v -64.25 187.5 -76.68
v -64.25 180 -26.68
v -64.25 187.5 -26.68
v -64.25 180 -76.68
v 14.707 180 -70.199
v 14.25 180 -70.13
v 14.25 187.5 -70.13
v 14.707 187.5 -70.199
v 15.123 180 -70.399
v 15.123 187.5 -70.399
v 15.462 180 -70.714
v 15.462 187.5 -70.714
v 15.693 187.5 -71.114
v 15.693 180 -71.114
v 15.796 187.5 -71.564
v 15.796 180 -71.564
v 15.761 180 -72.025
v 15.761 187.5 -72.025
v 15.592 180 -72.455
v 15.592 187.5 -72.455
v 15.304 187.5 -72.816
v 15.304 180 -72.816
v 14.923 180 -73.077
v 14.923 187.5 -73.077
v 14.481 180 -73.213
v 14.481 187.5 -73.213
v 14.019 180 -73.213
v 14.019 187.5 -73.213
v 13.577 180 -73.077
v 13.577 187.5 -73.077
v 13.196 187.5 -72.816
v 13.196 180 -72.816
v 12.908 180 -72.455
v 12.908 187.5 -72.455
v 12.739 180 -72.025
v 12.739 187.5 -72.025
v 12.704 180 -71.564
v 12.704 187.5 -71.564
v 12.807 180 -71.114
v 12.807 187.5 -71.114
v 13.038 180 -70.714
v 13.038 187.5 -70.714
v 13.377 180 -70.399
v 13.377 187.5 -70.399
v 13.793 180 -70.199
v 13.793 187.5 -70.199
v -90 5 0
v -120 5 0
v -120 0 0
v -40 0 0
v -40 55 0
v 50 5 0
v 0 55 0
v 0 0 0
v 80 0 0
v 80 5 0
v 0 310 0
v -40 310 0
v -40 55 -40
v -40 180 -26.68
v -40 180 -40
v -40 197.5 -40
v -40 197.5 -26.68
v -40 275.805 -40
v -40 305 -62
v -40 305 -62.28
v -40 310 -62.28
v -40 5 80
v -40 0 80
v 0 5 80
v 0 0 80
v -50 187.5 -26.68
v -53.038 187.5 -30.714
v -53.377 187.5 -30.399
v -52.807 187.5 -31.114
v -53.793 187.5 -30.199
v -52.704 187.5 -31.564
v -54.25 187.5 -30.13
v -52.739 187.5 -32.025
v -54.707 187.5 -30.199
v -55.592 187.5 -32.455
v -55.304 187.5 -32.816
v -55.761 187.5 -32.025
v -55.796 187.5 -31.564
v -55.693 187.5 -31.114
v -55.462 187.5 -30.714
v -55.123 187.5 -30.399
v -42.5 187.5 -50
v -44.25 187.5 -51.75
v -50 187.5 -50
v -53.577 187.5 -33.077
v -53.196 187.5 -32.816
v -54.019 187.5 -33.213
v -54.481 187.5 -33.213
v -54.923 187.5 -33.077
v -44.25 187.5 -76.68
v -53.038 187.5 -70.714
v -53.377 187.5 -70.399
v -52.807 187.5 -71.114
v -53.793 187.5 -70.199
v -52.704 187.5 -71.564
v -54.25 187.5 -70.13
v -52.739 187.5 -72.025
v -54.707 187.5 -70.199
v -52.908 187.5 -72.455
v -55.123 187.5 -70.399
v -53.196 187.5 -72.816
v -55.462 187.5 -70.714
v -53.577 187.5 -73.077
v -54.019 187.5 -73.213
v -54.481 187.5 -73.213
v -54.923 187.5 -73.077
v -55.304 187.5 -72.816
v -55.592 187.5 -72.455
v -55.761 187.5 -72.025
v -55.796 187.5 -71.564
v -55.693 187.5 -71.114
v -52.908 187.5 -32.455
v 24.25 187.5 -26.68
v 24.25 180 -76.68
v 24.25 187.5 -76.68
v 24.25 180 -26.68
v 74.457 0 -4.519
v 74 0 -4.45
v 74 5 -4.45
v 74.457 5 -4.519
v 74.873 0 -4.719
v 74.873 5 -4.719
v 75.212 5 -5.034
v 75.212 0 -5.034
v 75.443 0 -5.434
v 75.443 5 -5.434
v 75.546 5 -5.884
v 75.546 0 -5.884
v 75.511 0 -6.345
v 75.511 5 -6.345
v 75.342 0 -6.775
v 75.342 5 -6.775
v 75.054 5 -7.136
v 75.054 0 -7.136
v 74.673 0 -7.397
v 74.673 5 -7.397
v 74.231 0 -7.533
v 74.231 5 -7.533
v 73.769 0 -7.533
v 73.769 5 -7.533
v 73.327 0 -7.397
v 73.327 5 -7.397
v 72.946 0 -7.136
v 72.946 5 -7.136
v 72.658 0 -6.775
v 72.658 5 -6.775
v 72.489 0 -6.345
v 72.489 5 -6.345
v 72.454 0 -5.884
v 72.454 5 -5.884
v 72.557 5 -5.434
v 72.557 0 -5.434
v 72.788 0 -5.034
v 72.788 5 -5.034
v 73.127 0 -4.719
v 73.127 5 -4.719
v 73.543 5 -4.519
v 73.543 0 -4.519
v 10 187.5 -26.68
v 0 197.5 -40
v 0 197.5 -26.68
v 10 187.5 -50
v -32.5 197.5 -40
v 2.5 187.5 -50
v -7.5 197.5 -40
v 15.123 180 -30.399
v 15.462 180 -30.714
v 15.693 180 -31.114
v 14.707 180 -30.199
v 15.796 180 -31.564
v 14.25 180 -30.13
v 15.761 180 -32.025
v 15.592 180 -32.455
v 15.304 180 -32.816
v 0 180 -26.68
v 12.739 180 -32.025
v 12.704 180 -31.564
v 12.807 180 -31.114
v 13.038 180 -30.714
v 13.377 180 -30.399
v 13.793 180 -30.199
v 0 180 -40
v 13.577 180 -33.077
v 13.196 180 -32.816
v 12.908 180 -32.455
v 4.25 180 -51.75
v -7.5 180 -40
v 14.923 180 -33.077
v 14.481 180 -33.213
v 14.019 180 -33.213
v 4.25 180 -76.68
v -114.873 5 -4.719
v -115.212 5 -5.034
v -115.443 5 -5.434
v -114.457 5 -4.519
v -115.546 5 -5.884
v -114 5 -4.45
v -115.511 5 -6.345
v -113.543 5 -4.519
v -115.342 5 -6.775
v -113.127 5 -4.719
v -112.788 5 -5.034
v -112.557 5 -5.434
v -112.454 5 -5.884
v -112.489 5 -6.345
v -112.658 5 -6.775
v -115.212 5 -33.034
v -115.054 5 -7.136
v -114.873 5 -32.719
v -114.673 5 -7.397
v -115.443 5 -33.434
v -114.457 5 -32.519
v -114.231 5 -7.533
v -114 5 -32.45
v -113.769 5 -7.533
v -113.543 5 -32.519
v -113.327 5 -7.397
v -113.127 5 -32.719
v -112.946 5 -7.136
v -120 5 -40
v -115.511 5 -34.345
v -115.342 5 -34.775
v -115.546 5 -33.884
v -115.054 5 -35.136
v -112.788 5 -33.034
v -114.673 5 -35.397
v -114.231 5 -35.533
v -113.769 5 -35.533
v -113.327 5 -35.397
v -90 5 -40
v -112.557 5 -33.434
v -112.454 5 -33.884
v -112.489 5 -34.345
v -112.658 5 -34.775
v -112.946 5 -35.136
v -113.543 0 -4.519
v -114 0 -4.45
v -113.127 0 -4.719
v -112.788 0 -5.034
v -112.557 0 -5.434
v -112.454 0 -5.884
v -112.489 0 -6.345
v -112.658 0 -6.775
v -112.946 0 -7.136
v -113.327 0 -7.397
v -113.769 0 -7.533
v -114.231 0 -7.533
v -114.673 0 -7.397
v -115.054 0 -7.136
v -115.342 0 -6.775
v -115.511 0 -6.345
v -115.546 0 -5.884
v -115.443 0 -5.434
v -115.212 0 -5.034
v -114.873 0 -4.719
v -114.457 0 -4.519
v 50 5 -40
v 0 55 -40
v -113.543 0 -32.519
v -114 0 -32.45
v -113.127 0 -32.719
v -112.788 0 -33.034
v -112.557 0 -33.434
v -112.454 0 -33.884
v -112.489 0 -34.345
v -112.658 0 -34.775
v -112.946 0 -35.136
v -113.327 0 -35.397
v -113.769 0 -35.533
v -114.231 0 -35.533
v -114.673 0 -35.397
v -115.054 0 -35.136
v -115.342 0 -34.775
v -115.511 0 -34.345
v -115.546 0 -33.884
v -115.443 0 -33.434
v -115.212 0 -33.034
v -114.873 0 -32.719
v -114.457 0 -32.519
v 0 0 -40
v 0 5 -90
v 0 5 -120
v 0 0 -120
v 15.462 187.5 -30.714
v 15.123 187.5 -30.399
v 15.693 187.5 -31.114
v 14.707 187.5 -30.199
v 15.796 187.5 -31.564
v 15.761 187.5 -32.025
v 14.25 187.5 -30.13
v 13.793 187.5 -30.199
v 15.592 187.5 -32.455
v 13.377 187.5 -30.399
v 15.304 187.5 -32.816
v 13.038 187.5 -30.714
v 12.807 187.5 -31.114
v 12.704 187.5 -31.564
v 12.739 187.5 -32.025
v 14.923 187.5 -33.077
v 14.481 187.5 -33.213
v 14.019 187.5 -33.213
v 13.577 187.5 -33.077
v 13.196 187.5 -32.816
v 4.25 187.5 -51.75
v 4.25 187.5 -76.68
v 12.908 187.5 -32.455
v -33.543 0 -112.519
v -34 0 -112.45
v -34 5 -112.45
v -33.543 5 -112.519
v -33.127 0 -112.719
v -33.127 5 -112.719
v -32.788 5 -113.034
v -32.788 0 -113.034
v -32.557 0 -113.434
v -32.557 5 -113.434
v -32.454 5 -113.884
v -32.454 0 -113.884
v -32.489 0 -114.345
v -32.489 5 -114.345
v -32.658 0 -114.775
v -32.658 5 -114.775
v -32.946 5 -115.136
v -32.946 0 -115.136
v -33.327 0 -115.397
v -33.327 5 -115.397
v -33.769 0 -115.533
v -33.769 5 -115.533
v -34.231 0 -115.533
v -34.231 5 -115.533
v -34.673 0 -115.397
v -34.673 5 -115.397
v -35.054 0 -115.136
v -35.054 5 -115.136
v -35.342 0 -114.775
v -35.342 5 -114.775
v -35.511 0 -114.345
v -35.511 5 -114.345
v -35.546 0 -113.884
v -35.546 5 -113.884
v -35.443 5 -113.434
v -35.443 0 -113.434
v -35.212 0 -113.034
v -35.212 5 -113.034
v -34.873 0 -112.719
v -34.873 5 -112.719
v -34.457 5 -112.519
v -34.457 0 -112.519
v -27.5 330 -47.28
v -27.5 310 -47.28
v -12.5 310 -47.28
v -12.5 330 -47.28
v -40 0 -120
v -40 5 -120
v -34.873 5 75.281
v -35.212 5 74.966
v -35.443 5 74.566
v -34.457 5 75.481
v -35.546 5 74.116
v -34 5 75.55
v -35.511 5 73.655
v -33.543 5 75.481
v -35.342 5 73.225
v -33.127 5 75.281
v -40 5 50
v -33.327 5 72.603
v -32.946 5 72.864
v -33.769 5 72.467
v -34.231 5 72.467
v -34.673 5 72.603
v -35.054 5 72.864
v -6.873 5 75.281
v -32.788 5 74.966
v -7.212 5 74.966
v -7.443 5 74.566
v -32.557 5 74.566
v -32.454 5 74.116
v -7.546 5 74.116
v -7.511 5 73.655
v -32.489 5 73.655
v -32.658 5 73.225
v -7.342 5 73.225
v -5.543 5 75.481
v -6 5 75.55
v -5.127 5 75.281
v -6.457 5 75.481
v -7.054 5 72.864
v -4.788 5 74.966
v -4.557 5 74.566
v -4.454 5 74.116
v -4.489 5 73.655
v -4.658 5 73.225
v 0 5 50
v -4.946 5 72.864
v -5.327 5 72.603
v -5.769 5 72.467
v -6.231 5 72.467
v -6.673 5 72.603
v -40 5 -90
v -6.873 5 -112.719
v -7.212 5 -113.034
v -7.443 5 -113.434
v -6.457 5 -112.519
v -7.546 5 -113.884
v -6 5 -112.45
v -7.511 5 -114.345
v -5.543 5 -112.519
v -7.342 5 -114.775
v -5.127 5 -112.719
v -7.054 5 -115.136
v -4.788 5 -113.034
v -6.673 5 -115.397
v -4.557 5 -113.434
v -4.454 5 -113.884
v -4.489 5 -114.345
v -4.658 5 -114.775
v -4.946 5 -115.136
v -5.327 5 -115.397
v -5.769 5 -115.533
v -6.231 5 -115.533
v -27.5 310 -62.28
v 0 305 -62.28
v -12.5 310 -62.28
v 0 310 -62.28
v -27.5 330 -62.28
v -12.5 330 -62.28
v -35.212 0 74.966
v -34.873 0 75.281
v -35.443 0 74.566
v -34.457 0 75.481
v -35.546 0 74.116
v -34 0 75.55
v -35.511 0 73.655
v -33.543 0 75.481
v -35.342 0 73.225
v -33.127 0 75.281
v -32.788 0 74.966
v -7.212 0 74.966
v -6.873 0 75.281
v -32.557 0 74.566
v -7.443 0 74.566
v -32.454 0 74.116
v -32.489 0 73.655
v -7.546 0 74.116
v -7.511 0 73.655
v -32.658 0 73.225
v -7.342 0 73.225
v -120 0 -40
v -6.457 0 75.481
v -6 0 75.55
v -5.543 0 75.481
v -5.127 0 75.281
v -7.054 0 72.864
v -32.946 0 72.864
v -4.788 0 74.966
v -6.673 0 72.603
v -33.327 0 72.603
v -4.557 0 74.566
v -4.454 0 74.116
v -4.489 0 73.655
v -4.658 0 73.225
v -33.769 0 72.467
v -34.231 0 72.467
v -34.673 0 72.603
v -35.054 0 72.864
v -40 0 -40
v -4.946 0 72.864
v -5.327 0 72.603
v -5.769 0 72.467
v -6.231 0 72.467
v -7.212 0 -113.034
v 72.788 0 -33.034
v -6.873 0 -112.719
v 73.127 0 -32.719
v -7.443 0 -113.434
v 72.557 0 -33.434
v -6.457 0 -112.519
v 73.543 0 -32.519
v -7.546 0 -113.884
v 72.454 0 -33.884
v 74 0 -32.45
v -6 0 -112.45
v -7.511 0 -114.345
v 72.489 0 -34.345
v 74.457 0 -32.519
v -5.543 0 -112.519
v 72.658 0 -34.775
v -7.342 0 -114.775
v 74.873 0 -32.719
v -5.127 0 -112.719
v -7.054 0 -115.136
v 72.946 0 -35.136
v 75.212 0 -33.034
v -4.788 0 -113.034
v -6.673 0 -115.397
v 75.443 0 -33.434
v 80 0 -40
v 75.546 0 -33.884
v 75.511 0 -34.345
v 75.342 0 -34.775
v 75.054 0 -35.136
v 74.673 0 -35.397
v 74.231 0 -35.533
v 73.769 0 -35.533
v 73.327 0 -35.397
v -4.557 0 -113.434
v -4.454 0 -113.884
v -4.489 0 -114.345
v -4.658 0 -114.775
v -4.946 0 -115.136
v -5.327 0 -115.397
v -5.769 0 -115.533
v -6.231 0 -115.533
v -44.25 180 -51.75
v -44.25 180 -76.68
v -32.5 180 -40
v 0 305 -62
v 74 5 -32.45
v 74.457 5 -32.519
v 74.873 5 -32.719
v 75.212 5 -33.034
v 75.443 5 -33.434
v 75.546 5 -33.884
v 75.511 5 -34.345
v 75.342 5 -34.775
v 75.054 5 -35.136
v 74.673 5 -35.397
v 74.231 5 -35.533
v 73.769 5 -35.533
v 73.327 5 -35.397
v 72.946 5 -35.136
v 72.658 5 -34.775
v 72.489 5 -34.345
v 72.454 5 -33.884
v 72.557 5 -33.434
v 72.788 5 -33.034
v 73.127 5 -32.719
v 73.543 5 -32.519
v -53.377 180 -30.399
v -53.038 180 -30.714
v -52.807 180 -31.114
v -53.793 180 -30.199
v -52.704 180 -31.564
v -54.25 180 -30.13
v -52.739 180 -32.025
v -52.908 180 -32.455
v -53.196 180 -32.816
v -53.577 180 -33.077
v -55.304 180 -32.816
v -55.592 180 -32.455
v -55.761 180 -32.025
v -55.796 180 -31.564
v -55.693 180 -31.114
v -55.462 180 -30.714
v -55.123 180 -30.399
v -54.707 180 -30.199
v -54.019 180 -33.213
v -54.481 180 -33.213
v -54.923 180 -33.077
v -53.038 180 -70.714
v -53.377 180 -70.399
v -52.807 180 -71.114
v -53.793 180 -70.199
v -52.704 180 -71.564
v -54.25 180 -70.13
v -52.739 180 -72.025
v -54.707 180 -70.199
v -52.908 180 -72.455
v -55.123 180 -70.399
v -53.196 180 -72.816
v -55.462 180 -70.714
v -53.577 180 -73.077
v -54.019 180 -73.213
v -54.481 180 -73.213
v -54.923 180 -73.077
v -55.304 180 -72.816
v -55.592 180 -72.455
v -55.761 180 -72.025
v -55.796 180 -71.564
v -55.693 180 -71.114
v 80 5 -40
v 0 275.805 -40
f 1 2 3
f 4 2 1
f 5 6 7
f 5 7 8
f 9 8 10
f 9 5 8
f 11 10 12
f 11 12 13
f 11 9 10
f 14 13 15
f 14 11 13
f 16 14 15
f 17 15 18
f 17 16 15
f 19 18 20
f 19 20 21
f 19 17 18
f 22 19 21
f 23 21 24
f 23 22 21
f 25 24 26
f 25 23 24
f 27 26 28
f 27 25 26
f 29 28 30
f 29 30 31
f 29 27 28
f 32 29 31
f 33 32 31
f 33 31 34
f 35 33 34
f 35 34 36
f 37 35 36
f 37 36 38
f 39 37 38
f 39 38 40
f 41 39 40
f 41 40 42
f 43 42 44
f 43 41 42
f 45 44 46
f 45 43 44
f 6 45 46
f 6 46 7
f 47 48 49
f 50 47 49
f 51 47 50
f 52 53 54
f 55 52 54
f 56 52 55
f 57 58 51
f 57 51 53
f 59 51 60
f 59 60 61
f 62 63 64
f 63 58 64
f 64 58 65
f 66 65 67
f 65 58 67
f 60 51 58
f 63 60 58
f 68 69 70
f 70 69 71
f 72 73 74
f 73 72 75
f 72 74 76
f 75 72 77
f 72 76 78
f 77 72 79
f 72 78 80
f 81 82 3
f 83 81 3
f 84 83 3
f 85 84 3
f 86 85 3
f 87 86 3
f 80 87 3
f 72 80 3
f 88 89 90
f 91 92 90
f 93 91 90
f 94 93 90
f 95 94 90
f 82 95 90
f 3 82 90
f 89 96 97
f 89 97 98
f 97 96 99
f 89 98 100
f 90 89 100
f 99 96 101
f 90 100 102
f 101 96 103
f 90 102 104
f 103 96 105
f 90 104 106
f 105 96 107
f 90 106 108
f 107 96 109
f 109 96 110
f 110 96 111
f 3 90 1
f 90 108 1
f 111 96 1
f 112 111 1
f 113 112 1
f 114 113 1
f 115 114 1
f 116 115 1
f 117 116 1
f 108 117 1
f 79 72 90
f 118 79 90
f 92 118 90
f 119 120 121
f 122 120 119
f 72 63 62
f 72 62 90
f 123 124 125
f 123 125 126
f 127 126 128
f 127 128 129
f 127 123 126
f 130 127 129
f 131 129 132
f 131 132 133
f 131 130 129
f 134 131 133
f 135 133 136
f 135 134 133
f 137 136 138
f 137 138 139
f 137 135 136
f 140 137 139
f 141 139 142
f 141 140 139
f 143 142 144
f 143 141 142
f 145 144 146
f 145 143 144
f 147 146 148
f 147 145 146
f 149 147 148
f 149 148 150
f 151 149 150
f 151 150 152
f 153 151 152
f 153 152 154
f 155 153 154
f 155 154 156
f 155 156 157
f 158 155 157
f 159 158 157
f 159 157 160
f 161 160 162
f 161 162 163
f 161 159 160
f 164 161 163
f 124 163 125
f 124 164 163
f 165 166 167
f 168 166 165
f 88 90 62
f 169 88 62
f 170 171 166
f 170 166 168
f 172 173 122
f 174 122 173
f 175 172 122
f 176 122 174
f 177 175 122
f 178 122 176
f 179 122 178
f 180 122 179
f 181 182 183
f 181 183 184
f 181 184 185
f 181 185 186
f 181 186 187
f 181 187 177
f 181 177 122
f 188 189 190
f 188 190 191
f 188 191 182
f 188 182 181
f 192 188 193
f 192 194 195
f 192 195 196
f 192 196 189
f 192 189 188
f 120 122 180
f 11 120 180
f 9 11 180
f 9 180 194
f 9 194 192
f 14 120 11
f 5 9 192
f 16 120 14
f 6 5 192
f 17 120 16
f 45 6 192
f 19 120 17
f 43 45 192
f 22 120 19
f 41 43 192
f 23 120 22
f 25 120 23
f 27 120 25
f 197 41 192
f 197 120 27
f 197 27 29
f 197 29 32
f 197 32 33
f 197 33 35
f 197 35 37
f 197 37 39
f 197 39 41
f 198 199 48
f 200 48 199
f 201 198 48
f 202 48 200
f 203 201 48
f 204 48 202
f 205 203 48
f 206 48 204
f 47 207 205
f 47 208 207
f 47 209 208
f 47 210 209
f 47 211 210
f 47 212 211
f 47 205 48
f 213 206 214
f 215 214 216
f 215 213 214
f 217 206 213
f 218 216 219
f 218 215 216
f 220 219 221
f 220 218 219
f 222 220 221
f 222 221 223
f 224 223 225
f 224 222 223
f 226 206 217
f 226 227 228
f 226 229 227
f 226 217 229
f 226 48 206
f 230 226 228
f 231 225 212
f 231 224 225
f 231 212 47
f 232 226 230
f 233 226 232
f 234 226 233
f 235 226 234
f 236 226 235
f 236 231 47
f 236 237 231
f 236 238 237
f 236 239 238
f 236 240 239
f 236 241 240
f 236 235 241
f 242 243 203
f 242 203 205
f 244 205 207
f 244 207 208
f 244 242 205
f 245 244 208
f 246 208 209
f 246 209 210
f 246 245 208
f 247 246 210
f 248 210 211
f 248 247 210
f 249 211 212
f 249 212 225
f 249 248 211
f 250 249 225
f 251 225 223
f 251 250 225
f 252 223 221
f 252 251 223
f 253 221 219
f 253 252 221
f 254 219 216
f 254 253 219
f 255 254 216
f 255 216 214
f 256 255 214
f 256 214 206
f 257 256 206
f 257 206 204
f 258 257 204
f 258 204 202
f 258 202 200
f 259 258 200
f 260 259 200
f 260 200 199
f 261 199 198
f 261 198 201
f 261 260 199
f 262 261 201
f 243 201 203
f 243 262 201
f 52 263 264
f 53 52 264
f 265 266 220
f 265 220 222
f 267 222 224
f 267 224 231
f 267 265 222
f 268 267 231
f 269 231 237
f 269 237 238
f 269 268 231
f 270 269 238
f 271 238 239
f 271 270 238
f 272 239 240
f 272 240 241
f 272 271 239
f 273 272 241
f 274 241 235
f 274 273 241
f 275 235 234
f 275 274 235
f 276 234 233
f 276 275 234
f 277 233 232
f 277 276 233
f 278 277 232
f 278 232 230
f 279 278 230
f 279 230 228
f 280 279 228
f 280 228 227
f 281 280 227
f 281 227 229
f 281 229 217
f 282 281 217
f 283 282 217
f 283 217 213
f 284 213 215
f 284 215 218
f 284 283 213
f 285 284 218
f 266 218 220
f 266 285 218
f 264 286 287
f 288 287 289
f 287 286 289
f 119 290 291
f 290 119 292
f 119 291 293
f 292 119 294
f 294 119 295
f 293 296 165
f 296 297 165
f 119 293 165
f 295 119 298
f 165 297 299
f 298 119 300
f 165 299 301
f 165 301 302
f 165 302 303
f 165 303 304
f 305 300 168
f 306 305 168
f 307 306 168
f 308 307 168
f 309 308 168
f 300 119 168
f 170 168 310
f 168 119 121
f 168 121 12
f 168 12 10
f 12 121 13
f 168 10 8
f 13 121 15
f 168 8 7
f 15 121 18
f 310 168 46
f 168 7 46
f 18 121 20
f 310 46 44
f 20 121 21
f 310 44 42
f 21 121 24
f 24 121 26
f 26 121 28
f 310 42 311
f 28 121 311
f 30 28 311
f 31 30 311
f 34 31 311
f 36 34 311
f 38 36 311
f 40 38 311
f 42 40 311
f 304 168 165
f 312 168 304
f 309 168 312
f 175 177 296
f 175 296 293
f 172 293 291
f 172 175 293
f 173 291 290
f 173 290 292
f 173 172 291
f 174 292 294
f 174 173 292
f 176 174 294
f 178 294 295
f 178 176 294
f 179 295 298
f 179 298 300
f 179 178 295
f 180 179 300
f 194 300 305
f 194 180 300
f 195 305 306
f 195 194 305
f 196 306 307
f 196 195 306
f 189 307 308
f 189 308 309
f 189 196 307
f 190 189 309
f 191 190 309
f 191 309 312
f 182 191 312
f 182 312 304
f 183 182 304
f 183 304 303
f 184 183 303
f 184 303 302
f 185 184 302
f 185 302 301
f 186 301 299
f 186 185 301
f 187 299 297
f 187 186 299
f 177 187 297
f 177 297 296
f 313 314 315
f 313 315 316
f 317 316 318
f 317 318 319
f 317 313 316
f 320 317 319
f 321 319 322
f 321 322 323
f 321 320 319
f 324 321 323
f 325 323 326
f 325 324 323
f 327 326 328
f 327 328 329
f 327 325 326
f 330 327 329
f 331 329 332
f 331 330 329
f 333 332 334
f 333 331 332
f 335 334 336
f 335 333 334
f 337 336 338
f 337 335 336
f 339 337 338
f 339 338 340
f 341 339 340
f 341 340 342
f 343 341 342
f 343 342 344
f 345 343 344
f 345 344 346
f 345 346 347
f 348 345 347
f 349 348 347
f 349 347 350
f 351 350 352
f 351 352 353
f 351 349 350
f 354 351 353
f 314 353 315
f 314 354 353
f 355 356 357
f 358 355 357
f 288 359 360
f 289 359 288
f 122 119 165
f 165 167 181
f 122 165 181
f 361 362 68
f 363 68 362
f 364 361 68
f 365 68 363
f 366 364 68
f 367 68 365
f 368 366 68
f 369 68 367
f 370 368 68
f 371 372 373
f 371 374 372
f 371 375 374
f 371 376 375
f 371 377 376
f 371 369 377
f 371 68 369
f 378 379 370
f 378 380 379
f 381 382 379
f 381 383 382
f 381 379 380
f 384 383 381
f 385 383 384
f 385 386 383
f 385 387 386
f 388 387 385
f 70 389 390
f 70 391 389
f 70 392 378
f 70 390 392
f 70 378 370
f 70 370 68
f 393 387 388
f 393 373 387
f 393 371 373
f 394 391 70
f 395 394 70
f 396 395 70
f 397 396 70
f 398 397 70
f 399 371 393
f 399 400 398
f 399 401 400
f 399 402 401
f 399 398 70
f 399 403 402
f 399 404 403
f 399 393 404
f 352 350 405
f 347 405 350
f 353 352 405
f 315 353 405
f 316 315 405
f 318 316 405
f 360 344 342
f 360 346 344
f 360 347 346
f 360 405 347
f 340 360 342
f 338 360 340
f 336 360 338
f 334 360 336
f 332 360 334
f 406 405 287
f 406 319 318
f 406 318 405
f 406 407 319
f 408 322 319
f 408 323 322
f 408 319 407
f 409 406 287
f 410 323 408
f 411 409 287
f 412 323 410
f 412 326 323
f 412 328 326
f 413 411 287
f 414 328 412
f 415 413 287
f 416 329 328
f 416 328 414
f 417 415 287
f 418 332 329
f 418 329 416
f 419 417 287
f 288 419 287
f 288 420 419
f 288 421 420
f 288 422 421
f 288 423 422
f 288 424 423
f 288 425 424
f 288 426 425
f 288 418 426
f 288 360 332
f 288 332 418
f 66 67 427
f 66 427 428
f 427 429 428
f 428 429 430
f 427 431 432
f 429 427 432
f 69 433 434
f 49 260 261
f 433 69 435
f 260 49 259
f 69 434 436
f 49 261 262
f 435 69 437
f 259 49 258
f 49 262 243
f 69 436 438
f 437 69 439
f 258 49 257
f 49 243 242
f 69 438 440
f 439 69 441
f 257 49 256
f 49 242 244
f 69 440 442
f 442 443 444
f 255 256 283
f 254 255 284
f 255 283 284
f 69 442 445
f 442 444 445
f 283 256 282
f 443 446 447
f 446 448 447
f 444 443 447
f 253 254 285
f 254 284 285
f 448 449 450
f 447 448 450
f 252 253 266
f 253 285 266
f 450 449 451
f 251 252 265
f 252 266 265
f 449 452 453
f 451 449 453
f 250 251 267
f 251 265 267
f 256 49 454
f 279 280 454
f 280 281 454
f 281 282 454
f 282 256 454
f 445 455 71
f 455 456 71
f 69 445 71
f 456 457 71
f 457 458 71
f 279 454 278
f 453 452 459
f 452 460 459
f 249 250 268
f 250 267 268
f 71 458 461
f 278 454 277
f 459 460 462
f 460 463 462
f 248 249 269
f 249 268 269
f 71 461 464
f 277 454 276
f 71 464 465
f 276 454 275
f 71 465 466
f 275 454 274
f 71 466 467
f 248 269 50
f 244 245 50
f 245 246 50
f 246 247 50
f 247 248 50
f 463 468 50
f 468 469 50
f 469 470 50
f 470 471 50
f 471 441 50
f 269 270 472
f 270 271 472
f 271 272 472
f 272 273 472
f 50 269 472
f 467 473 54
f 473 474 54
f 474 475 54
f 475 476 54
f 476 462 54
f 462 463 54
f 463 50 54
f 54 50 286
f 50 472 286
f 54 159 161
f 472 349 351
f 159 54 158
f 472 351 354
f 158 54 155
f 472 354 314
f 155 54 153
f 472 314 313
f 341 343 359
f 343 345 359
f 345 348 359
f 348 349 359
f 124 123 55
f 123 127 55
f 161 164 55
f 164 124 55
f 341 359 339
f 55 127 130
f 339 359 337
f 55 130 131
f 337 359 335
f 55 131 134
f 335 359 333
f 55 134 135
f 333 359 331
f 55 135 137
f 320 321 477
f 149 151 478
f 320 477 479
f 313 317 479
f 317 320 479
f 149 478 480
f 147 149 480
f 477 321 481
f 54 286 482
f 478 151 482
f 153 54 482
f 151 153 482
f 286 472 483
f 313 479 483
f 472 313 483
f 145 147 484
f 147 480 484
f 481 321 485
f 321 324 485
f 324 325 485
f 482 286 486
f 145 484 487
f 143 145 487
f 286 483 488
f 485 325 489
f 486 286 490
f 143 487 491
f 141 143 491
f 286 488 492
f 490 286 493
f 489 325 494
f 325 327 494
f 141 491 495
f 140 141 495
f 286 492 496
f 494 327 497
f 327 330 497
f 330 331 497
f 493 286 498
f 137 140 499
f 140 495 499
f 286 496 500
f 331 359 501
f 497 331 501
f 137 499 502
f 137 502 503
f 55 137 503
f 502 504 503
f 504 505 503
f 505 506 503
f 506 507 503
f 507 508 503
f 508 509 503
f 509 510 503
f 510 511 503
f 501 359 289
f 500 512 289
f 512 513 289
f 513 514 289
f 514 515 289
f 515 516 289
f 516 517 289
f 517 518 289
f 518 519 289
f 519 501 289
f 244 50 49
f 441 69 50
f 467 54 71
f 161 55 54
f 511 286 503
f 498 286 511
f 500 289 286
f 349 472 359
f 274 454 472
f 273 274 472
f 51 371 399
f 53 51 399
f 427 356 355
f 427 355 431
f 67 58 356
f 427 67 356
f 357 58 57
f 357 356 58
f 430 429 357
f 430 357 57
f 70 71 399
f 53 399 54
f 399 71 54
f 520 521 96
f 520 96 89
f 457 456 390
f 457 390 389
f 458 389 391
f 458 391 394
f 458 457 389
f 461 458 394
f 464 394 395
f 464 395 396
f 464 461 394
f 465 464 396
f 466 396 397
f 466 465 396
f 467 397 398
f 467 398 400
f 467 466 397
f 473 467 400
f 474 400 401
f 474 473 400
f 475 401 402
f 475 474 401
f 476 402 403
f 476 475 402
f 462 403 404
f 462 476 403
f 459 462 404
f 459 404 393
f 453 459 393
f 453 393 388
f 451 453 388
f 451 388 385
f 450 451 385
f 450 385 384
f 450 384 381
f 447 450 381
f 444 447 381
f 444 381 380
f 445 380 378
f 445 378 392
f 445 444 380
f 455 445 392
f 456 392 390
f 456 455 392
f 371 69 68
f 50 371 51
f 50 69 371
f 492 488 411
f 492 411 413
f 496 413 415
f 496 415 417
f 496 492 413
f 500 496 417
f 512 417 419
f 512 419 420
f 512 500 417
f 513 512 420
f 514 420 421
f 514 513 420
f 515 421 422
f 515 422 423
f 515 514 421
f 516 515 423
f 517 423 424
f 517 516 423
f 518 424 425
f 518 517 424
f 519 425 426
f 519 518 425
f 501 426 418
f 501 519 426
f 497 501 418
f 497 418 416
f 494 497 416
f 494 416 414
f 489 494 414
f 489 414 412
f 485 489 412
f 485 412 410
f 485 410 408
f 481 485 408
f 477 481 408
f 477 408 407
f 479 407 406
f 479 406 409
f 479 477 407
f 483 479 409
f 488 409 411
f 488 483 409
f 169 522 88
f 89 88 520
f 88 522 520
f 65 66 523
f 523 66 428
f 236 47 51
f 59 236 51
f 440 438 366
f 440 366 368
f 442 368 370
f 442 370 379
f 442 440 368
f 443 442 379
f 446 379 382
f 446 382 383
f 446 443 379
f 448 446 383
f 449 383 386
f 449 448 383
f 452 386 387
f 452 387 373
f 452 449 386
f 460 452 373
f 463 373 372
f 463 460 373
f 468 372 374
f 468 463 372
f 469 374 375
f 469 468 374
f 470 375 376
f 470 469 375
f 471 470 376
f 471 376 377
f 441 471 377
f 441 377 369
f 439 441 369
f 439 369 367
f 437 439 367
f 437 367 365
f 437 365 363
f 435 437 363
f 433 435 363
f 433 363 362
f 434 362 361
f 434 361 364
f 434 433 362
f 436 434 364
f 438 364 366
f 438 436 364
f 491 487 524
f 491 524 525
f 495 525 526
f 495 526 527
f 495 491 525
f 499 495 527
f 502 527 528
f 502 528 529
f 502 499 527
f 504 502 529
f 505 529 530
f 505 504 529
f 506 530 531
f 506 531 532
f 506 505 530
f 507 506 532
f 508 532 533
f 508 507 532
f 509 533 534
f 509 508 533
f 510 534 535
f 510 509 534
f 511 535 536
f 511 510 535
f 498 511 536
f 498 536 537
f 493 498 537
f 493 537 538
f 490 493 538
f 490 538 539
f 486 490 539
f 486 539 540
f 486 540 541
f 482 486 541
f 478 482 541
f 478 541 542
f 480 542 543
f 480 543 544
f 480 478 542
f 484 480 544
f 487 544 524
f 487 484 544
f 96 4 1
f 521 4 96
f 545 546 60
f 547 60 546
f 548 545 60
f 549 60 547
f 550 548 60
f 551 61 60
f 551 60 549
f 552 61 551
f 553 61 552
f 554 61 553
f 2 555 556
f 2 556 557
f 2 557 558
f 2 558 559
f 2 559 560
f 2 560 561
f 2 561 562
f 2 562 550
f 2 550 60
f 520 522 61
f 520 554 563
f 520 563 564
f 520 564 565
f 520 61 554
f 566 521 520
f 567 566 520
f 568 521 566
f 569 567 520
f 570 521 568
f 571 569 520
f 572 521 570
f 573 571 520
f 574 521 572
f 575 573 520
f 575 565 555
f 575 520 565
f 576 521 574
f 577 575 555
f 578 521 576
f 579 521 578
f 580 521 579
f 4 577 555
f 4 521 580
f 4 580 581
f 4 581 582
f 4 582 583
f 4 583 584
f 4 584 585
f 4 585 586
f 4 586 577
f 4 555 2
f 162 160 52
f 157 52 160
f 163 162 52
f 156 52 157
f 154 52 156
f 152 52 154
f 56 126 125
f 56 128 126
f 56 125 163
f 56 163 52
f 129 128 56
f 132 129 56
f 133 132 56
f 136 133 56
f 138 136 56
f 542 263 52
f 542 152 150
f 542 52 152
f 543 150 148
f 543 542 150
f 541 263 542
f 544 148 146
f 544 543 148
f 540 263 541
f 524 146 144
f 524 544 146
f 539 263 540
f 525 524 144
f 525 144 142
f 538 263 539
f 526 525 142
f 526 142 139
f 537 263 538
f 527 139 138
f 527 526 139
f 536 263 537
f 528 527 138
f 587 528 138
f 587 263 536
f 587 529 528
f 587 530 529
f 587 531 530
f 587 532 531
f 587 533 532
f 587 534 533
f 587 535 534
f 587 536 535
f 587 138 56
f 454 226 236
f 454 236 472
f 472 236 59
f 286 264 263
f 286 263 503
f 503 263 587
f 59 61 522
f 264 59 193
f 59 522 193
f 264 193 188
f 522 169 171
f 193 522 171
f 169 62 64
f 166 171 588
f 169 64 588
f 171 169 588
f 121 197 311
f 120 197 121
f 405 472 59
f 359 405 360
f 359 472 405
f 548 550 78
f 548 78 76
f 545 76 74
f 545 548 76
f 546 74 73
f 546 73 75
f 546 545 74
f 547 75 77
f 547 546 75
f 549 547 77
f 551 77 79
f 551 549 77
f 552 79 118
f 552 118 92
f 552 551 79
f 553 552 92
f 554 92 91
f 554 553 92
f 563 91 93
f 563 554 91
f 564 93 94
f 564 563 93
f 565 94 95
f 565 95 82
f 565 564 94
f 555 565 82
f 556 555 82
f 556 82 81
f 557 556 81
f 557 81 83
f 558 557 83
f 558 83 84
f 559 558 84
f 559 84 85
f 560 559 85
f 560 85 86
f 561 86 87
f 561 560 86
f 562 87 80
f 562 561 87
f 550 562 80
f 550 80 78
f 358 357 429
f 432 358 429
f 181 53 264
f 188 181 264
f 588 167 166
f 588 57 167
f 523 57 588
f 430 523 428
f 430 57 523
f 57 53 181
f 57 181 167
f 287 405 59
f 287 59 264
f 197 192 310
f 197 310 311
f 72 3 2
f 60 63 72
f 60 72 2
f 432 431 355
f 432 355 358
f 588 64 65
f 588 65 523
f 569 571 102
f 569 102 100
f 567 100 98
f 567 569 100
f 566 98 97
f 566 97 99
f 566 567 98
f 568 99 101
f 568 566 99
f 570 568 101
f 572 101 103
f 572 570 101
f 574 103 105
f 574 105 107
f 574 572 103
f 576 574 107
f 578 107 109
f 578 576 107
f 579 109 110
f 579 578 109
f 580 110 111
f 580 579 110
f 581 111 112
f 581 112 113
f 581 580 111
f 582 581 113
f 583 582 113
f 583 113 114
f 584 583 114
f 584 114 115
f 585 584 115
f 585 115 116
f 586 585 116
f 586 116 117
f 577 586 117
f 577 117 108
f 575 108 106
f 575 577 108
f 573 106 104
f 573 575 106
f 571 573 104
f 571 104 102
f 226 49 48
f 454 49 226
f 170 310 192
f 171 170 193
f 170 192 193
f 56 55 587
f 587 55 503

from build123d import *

# Parameters (mm, degrees)
SKETCH1_W             = 80
SKETCH1_H             = 40
SKETCH1_R             = 1.55
BOSS_EXTRUDE1_DEPTH   = 5
SKETCH1_W_2           = 40
SKETCH1_H_2           = 80
BOSS_EXTRUDE1_2_DEPTH = 5
BOSS_EXTRUDE1_3_DEPTH = 5
BOSS_EXTRUDE1_4_DEPTH = 5
SKETCH1_4_W           = 40
SKETCH1_4_H           = 40
BOSS_EXTRUDE2_DEPTH   = 310
CHAMFER1_SIZE         = 50
CHAMFER2_SIZE         = 50
BOSS_EXTRUDE3_START   = 180
SKETCH2_R             = 1.55
BOSS_EXTRUDE3_DEPTH   = 7.5
CHAMFER7_SIZE         = 10
SKETCH3_W             = 15
SKETCH3_H             = 15
BOSS_EXTRUDE4_DEPTH   = 20
SKETCH4_W             = 40
SKETCH4_H             = 22.28
BOSS_EXTRUDE5_DEPTH   = 5
CHAMFER8_SIZE         = 22
CHAMFER8_SIZE2        = 29.194986076


# Some blends are built 0.0001 mm under size
with BuildPart() as part:
    # Sketch1 → Boss-Extrude1 (new body)
    with BuildSketch(Plane(origin=(0, 0, 0), x_dir=(1, 0, 0), z_dir=(0, 1, 0))):
        with Locations((40, 20)):
            Rectangle(SKETCH1_W, SKETCH1_H)
        with Locations(Location((74, 6, 0), (0, 0, 270))):
            Circle(SKETCH1_R, mode=Mode.SUBTRACT)
        with Locations(Location((74, 34, 0), (0, 0, 270))):
            Circle(SKETCH1_R, mode=Mode.SUBTRACT)
    extrude(amount=BOSS_EXTRUDE1_DEPTH)



with BuildPart() as body_2:
    # Sketch1 → Boss-Extrude1 2 (new body)
    with BuildSketch(Plane(origin=(0, 0, 0), x_dir=(1, 0, 0), z_dir=(0, 1, 0))):
        with Locations((-20, 80)):
            Rectangle(SKETCH1_W_2, SKETCH1_H_2)
        with Locations(Location((-34, 114, 0), (0, 0, 270))):
            Circle(SKETCH1_R, mode=Mode.SUBTRACT)
        with Locations(Location((-6, 114, 0), (0, 0, 270))):
            Circle(SKETCH1_R, mode=Mode.SUBTRACT)
    extrude(amount=BOSS_EXTRUDE1_2_DEPTH)


with BuildPart() as body_3:
    # Sketch1 → Boss-Extrude1 3 (new body)
    with BuildSketch(Plane(origin=(0, 0, 0), x_dir=(1, 0, 0), z_dir=(0, 1, 0))):
        with Locations((-80, 20)):
            Rectangle(SKETCH1_W, SKETCH1_H)
        with Locations(Location((-114, 6, 0), (0, 0, 270))):
            Circle(SKETCH1_R, mode=Mode.SUBTRACT)
        with Locations(Location((-114, 34, 0), (0, 0, 270))):
            Circle(SKETCH1_R, mode=Mode.SUBTRACT)
    extrude(amount=BOSS_EXTRUDE1_3_DEPTH)


with BuildPart() as body_4:
    # Sketch1 → Boss-Extrude1 4 (new body)
    with BuildSketch(Plane(origin=(0, 0, 0), x_dir=(1, 0, 0), z_dir=(0, 1, 0))):
        with Locations((-20, -40)):
            Rectangle(SKETCH1_W_2, SKETCH1_H_2)
        with Locations(Location((-34, -74, 0), (0, 0, 270))):
            Circle(SKETCH1_R, mode=Mode.SUBTRACT)
        with Locations(Location((-6, -74, 0), (0, 0, 270))):
            Circle(SKETCH1_R, mode=Mode.SUBTRACT)
    extrude(amount=BOSS_EXTRUDE1_4_DEPTH)


with BuildPart() as part_1:
    add(part.part)

    add(body_2.part)  # Boss-Extrude2 merges body 2

    add(body_3.part)  # Boss-Extrude2 merges body 3

    add(body_4.part)  # Boss-Extrude2 merges body 4
    # Sketch1<4> → Boss-Extrude2 (add)
    with BuildSketch(Plane(origin=(0, 0, 0), x_dir=(1, 0, 0), z_dir=(0, 1, 0))):
        with Locations((-20, 20)):
            Rectangle(SKETCH1_4_W, SKETCH1_4_H)
    extrude(amount=BOSS_EXTRUDE2_DEPTH)

    # Chamfer1
    # the kernel refuses this chamfer: 50 mm, written as the material it adds along each edge
    with BuildSketch(Plane(origin=(0, 5, -40), x_dir=(1, 0, 0), z_dir=(0, 0, 1)), Plane(origin=(-40, 5, 0), x_dir=(-1, 0, 0), z_dir=(0, 0, -1))) as chamfer1_piece_1:
        Polygon((CHAMFER1_SIZE, 0), (0, CHAMFER1_SIZE), (0, 0), align=None)
    extrude(amount=40)

    # Chamfer2
    chamfer2_edges = [part_1.edges().sort_by_distance(p)[0] for p in [
        (-20, 5, -40),
        (-20, 5, 0),
    ]]
    chamfer(chamfer2_edges, length=CHAMFER2_SIZE - 0.0001)  # a hair under: the kernel refuses the full size

    # Sketch2 → Boss-Extrude3 (add)
    with BuildSketch(Plane(origin=(0, 0, 0), x_dir=(1, 0, 0), z_dir=(0, 1, 0)).offset(BOSS_EXTRUDE3_START)):
        Polygon((-64.25, 76.68), (-44.25, 76.68), (-44.25, 51.75), (-32.5, 40), (-7.5, 40), (4.25, 51.75), (4.25, 76.68), (24.25, 76.68), (24.25, 26.68), (-40, 26.68), (-64.25, 26.68), align=None)
        with Locations(Location((-54.25, 71.68, 0), (0, 0, 270))):
            Circle(SKETCH2_R, mode=Mode.SUBTRACT)
        with Locations(Location((14.25, 71.68, 0), (0, 0, 270))):
            Circle(SKETCH2_R, mode=Mode.SUBTRACT)
        with Locations(Location((-54.25, 31.68, 0), (0, 0, 270))):
            Circle(SKETCH2_R, mode=Mode.SUBTRACT)
        with Locations(Location((14.25, 31.68, 0), (0, 0, 270))):
            Circle(SKETCH2_R, mode=Mode.SUBTRACT)
    extrude(amount=BOSS_EXTRUDE3_DEPTH)

    # Chamfer7
    # the kernel refuses this chamfer: 10 mm, written as the material it adds along each edge
    with BuildSketch(Plane(origin=(-40, 187.5, -26.68), x_dir=(0, 1, 0), z_dir=(0, 0, -1))) as chamfer7_piece_1_section:
        Polygon((CHAMFER7_SIZE, 0), (0, -CHAMFER7_SIZE), (0, 0), align=None)
    chamfer7_piece_1 = extrude(amount=39.03682988, mode=Mode.PRIVATE)
    chamfer7_piece_1 = split(chamfer7_piece_1, bisect_by=Plane(origin=(-29.59, 187.5, -37.09), z_dir=(-0.7071067811865485, 0, 0.7071067811865467)), keep=Keep.TOP, mode=Mode.PRIVATE)
    chamfer7_piece_1 = split(chamfer7_piece_1, bisect_by=Plane(origin=(-40, 199.16, -38.34), z_dir=(0, -0.7071067811865476, 0.7071067811865476)), keep=Keep.TOP, mode=Mode.PRIVATE)
    add(chamfer7_piece_1)
    with BuildSketch(Plane(origin=(0, 187.5, -65.71682988), x_dir=(0, 1, 0), z_dir=(0, 0, 1))) as chamfer7_piece_2_section:
        Polygon((CHAMFER7_SIZE, 0), (0, -CHAMFER7_SIZE), (0, 0), align=None)
    chamfer7_piece_2 = extrude(amount=39.03682988, mode=Mode.PRIVATE)
    chamfer7_piece_2 = split(chamfer7_piece_2, bisect_by=Plane(origin=(9.10841494, 187.5, -56.60841494), z_dir=(0.7071067811865488, 0, 0.7071067811865462)), keep=Keep.TOP, mode=Mode.PRIVATE)
    chamfer7_piece_2 = split(chamfer7_piece_2, bisect_by=Plane(origin=(0, 179.64158506, -57.85841494), z_dir=(0, -0.7071067811865476, 0.7071067811865476)), keep=Keep.TOP, mode=Mode.PRIVATE)
    add(chamfer7_piece_2)
    with BuildSketch(Plane(origin=(-33.21682988, 187.5, -40), x_dir=(0, 1, 0), z_dir=(1, 0, 0))) as chamfer7_piece_3_section:
        Polygon((CHAMFER7_SIZE, 0), (0, -CHAMFER7_SIZE), (0, 0), align=None)
    chamfer7_piece_3 = extrude(amount=58.933659759, mode=Mode.PRIVATE)
    chamfer7_piece_3 = split(chamfer7_piece_3, bisect_by=Plane(origin=(-32.85841494, 187.5, -40.35841494), z_dir=(-0.7071067811865485, 0, 0.7071067811865467)), keep=Keep.TOP, mode=Mode.PRIVATE)
    add(chamfer7_piece_3)
    with BuildSketch(Plane(origin=(-33.21682988, 187.5, -40), x_dir=(0, 1, 0), z_dir=(1, 0, 0))) as chamfer7_piece_4_section:
        Polygon((CHAMFER7_SIZE, 0), (0, -CHAMFER7_SIZE), (0, 0), align=None)
    chamfer7_piece_4 = extrude(amount=58.933659759, mode=Mode.PRIVATE)
    chamfer7_piece_4 = split(chamfer7_piece_4, bisect_by=Plane(origin=(-20.35841494, 187.5, -27.14158506), z_dir=(0.7071067811865488, 0, 0.7071067811865462)), keep=Keep.TOP, mode=Mode.PRIVATE)
    chamfer7_piece_4 = split(chamfer7_piece_4, bisect_by=Plane(origin=(-11.60841494, 209.10841494, -40), z_dir=(-0.7071067811865476, -0.7071067811865476, 0)), keep=Keep.TOP, mode=Mode.PRIVATE)
    add(chamfer7_piece_4)
    with BuildSketch(Plane(origin=(-65.71682988, 187.5, -40), x_dir=(0, 1, 0), z_dir=(1, 0, 0))) as chamfer7_piece_5_section:
        Polygon((CHAMFER7_SIZE, 0), (0, -CHAMFER7_SIZE), (0, 0), align=None)
    chamfer7_piece_5 = extrude(amount=58.933659759, mode=Mode.PRIVATE)
    chamfer7_piece_5 = split(chamfer7_piece_5, bisect_by=Plane(origin=(-49.10841494, 187.5, -56.60841494), z_dir=(-0.7071067811865485, 0, 0.7071067811865467)), keep=Keep.TOP, mode=Mode.PRIVATE)
    chamfer7_piece_5 = split(chamfer7_piece_5, bisect_by=Plane(origin=(-57.85841494, 179.64158506, -40), z_dir=(0.7071067811865476, -0.7071067811865476, 0)), keep=Keep.TOP, mode=Mode.PRIVATE)
    add(chamfer7_piece_5)
    with BuildSketch(Plane(origin=(-65.71682988, 187.5, -40), x_dir=(0, 1, 0), z_dir=(1, 0, 0))) as chamfer7_piece_6_section:
        Polygon((CHAMFER7_SIZE, 0), (0, -CHAMFER7_SIZE), (0, 0), align=None)
    chamfer7_piece_6 = extrude(amount=58.933659759, mode=Mode.PRIVATE)
    chamfer7_piece_6 = split(chamfer7_piece_6, bisect_by=Plane(origin=(-36.60841494, 187.5, -10.89158506), z_dir=(0.7071067811865488, 0, 0.7071067811865462)), keep=Keep.TOP, mode=Mode.PRIVATE)
    add(chamfer7_piece_6)



with BuildPart() as body_2_2:
    # Sketch3 → Boss-Extrude4 (new body)
    with BuildSketch(Plane(origin=(0, 310, 0), x_dir=(1, 0, 0), z_dir=(0, 1, 0))):
        with Locations((-20, 54.78)):
            Rectangle(SKETCH3_W, SKETCH3_H)
    extrude(amount=BOSS_EXTRUDE4_DEPTH)


with BuildPart() as part_2:
    add(part_1.part)

    add(body_2_2.part)  # Boss-Extrude5 merges body 2 2
    # Sketch4 → Boss-Extrude5 (add)
    with BuildSketch(Plane(origin=(0, 310, 0), x_dir=(1, 0, 0), z_dir=(0, 1, 0))):
        with Locations((-20, 51.14)):
            Rectangle(SKETCH4_W, SKETCH4_H)
    extrude(amount=-BOSS_EXTRUDE5_DEPTH)

    # Chamfer8
    chamfer8_edges = [part_2.edges().sort_by_distance(p)[0] for p in [
        (-20, 305, -40),
    ]]
    chamfer8_side = [part_2.faces().sort_by_distance(p)[0] for p in [
        (-20, 305, -51.14),
    ]]
    chamfer(chamfer8_edges, length=CHAMFER8_SIZE, length2=CHAMFER8_SIZE2, reference=chamfer8_side[0])


solid = part_2.part
